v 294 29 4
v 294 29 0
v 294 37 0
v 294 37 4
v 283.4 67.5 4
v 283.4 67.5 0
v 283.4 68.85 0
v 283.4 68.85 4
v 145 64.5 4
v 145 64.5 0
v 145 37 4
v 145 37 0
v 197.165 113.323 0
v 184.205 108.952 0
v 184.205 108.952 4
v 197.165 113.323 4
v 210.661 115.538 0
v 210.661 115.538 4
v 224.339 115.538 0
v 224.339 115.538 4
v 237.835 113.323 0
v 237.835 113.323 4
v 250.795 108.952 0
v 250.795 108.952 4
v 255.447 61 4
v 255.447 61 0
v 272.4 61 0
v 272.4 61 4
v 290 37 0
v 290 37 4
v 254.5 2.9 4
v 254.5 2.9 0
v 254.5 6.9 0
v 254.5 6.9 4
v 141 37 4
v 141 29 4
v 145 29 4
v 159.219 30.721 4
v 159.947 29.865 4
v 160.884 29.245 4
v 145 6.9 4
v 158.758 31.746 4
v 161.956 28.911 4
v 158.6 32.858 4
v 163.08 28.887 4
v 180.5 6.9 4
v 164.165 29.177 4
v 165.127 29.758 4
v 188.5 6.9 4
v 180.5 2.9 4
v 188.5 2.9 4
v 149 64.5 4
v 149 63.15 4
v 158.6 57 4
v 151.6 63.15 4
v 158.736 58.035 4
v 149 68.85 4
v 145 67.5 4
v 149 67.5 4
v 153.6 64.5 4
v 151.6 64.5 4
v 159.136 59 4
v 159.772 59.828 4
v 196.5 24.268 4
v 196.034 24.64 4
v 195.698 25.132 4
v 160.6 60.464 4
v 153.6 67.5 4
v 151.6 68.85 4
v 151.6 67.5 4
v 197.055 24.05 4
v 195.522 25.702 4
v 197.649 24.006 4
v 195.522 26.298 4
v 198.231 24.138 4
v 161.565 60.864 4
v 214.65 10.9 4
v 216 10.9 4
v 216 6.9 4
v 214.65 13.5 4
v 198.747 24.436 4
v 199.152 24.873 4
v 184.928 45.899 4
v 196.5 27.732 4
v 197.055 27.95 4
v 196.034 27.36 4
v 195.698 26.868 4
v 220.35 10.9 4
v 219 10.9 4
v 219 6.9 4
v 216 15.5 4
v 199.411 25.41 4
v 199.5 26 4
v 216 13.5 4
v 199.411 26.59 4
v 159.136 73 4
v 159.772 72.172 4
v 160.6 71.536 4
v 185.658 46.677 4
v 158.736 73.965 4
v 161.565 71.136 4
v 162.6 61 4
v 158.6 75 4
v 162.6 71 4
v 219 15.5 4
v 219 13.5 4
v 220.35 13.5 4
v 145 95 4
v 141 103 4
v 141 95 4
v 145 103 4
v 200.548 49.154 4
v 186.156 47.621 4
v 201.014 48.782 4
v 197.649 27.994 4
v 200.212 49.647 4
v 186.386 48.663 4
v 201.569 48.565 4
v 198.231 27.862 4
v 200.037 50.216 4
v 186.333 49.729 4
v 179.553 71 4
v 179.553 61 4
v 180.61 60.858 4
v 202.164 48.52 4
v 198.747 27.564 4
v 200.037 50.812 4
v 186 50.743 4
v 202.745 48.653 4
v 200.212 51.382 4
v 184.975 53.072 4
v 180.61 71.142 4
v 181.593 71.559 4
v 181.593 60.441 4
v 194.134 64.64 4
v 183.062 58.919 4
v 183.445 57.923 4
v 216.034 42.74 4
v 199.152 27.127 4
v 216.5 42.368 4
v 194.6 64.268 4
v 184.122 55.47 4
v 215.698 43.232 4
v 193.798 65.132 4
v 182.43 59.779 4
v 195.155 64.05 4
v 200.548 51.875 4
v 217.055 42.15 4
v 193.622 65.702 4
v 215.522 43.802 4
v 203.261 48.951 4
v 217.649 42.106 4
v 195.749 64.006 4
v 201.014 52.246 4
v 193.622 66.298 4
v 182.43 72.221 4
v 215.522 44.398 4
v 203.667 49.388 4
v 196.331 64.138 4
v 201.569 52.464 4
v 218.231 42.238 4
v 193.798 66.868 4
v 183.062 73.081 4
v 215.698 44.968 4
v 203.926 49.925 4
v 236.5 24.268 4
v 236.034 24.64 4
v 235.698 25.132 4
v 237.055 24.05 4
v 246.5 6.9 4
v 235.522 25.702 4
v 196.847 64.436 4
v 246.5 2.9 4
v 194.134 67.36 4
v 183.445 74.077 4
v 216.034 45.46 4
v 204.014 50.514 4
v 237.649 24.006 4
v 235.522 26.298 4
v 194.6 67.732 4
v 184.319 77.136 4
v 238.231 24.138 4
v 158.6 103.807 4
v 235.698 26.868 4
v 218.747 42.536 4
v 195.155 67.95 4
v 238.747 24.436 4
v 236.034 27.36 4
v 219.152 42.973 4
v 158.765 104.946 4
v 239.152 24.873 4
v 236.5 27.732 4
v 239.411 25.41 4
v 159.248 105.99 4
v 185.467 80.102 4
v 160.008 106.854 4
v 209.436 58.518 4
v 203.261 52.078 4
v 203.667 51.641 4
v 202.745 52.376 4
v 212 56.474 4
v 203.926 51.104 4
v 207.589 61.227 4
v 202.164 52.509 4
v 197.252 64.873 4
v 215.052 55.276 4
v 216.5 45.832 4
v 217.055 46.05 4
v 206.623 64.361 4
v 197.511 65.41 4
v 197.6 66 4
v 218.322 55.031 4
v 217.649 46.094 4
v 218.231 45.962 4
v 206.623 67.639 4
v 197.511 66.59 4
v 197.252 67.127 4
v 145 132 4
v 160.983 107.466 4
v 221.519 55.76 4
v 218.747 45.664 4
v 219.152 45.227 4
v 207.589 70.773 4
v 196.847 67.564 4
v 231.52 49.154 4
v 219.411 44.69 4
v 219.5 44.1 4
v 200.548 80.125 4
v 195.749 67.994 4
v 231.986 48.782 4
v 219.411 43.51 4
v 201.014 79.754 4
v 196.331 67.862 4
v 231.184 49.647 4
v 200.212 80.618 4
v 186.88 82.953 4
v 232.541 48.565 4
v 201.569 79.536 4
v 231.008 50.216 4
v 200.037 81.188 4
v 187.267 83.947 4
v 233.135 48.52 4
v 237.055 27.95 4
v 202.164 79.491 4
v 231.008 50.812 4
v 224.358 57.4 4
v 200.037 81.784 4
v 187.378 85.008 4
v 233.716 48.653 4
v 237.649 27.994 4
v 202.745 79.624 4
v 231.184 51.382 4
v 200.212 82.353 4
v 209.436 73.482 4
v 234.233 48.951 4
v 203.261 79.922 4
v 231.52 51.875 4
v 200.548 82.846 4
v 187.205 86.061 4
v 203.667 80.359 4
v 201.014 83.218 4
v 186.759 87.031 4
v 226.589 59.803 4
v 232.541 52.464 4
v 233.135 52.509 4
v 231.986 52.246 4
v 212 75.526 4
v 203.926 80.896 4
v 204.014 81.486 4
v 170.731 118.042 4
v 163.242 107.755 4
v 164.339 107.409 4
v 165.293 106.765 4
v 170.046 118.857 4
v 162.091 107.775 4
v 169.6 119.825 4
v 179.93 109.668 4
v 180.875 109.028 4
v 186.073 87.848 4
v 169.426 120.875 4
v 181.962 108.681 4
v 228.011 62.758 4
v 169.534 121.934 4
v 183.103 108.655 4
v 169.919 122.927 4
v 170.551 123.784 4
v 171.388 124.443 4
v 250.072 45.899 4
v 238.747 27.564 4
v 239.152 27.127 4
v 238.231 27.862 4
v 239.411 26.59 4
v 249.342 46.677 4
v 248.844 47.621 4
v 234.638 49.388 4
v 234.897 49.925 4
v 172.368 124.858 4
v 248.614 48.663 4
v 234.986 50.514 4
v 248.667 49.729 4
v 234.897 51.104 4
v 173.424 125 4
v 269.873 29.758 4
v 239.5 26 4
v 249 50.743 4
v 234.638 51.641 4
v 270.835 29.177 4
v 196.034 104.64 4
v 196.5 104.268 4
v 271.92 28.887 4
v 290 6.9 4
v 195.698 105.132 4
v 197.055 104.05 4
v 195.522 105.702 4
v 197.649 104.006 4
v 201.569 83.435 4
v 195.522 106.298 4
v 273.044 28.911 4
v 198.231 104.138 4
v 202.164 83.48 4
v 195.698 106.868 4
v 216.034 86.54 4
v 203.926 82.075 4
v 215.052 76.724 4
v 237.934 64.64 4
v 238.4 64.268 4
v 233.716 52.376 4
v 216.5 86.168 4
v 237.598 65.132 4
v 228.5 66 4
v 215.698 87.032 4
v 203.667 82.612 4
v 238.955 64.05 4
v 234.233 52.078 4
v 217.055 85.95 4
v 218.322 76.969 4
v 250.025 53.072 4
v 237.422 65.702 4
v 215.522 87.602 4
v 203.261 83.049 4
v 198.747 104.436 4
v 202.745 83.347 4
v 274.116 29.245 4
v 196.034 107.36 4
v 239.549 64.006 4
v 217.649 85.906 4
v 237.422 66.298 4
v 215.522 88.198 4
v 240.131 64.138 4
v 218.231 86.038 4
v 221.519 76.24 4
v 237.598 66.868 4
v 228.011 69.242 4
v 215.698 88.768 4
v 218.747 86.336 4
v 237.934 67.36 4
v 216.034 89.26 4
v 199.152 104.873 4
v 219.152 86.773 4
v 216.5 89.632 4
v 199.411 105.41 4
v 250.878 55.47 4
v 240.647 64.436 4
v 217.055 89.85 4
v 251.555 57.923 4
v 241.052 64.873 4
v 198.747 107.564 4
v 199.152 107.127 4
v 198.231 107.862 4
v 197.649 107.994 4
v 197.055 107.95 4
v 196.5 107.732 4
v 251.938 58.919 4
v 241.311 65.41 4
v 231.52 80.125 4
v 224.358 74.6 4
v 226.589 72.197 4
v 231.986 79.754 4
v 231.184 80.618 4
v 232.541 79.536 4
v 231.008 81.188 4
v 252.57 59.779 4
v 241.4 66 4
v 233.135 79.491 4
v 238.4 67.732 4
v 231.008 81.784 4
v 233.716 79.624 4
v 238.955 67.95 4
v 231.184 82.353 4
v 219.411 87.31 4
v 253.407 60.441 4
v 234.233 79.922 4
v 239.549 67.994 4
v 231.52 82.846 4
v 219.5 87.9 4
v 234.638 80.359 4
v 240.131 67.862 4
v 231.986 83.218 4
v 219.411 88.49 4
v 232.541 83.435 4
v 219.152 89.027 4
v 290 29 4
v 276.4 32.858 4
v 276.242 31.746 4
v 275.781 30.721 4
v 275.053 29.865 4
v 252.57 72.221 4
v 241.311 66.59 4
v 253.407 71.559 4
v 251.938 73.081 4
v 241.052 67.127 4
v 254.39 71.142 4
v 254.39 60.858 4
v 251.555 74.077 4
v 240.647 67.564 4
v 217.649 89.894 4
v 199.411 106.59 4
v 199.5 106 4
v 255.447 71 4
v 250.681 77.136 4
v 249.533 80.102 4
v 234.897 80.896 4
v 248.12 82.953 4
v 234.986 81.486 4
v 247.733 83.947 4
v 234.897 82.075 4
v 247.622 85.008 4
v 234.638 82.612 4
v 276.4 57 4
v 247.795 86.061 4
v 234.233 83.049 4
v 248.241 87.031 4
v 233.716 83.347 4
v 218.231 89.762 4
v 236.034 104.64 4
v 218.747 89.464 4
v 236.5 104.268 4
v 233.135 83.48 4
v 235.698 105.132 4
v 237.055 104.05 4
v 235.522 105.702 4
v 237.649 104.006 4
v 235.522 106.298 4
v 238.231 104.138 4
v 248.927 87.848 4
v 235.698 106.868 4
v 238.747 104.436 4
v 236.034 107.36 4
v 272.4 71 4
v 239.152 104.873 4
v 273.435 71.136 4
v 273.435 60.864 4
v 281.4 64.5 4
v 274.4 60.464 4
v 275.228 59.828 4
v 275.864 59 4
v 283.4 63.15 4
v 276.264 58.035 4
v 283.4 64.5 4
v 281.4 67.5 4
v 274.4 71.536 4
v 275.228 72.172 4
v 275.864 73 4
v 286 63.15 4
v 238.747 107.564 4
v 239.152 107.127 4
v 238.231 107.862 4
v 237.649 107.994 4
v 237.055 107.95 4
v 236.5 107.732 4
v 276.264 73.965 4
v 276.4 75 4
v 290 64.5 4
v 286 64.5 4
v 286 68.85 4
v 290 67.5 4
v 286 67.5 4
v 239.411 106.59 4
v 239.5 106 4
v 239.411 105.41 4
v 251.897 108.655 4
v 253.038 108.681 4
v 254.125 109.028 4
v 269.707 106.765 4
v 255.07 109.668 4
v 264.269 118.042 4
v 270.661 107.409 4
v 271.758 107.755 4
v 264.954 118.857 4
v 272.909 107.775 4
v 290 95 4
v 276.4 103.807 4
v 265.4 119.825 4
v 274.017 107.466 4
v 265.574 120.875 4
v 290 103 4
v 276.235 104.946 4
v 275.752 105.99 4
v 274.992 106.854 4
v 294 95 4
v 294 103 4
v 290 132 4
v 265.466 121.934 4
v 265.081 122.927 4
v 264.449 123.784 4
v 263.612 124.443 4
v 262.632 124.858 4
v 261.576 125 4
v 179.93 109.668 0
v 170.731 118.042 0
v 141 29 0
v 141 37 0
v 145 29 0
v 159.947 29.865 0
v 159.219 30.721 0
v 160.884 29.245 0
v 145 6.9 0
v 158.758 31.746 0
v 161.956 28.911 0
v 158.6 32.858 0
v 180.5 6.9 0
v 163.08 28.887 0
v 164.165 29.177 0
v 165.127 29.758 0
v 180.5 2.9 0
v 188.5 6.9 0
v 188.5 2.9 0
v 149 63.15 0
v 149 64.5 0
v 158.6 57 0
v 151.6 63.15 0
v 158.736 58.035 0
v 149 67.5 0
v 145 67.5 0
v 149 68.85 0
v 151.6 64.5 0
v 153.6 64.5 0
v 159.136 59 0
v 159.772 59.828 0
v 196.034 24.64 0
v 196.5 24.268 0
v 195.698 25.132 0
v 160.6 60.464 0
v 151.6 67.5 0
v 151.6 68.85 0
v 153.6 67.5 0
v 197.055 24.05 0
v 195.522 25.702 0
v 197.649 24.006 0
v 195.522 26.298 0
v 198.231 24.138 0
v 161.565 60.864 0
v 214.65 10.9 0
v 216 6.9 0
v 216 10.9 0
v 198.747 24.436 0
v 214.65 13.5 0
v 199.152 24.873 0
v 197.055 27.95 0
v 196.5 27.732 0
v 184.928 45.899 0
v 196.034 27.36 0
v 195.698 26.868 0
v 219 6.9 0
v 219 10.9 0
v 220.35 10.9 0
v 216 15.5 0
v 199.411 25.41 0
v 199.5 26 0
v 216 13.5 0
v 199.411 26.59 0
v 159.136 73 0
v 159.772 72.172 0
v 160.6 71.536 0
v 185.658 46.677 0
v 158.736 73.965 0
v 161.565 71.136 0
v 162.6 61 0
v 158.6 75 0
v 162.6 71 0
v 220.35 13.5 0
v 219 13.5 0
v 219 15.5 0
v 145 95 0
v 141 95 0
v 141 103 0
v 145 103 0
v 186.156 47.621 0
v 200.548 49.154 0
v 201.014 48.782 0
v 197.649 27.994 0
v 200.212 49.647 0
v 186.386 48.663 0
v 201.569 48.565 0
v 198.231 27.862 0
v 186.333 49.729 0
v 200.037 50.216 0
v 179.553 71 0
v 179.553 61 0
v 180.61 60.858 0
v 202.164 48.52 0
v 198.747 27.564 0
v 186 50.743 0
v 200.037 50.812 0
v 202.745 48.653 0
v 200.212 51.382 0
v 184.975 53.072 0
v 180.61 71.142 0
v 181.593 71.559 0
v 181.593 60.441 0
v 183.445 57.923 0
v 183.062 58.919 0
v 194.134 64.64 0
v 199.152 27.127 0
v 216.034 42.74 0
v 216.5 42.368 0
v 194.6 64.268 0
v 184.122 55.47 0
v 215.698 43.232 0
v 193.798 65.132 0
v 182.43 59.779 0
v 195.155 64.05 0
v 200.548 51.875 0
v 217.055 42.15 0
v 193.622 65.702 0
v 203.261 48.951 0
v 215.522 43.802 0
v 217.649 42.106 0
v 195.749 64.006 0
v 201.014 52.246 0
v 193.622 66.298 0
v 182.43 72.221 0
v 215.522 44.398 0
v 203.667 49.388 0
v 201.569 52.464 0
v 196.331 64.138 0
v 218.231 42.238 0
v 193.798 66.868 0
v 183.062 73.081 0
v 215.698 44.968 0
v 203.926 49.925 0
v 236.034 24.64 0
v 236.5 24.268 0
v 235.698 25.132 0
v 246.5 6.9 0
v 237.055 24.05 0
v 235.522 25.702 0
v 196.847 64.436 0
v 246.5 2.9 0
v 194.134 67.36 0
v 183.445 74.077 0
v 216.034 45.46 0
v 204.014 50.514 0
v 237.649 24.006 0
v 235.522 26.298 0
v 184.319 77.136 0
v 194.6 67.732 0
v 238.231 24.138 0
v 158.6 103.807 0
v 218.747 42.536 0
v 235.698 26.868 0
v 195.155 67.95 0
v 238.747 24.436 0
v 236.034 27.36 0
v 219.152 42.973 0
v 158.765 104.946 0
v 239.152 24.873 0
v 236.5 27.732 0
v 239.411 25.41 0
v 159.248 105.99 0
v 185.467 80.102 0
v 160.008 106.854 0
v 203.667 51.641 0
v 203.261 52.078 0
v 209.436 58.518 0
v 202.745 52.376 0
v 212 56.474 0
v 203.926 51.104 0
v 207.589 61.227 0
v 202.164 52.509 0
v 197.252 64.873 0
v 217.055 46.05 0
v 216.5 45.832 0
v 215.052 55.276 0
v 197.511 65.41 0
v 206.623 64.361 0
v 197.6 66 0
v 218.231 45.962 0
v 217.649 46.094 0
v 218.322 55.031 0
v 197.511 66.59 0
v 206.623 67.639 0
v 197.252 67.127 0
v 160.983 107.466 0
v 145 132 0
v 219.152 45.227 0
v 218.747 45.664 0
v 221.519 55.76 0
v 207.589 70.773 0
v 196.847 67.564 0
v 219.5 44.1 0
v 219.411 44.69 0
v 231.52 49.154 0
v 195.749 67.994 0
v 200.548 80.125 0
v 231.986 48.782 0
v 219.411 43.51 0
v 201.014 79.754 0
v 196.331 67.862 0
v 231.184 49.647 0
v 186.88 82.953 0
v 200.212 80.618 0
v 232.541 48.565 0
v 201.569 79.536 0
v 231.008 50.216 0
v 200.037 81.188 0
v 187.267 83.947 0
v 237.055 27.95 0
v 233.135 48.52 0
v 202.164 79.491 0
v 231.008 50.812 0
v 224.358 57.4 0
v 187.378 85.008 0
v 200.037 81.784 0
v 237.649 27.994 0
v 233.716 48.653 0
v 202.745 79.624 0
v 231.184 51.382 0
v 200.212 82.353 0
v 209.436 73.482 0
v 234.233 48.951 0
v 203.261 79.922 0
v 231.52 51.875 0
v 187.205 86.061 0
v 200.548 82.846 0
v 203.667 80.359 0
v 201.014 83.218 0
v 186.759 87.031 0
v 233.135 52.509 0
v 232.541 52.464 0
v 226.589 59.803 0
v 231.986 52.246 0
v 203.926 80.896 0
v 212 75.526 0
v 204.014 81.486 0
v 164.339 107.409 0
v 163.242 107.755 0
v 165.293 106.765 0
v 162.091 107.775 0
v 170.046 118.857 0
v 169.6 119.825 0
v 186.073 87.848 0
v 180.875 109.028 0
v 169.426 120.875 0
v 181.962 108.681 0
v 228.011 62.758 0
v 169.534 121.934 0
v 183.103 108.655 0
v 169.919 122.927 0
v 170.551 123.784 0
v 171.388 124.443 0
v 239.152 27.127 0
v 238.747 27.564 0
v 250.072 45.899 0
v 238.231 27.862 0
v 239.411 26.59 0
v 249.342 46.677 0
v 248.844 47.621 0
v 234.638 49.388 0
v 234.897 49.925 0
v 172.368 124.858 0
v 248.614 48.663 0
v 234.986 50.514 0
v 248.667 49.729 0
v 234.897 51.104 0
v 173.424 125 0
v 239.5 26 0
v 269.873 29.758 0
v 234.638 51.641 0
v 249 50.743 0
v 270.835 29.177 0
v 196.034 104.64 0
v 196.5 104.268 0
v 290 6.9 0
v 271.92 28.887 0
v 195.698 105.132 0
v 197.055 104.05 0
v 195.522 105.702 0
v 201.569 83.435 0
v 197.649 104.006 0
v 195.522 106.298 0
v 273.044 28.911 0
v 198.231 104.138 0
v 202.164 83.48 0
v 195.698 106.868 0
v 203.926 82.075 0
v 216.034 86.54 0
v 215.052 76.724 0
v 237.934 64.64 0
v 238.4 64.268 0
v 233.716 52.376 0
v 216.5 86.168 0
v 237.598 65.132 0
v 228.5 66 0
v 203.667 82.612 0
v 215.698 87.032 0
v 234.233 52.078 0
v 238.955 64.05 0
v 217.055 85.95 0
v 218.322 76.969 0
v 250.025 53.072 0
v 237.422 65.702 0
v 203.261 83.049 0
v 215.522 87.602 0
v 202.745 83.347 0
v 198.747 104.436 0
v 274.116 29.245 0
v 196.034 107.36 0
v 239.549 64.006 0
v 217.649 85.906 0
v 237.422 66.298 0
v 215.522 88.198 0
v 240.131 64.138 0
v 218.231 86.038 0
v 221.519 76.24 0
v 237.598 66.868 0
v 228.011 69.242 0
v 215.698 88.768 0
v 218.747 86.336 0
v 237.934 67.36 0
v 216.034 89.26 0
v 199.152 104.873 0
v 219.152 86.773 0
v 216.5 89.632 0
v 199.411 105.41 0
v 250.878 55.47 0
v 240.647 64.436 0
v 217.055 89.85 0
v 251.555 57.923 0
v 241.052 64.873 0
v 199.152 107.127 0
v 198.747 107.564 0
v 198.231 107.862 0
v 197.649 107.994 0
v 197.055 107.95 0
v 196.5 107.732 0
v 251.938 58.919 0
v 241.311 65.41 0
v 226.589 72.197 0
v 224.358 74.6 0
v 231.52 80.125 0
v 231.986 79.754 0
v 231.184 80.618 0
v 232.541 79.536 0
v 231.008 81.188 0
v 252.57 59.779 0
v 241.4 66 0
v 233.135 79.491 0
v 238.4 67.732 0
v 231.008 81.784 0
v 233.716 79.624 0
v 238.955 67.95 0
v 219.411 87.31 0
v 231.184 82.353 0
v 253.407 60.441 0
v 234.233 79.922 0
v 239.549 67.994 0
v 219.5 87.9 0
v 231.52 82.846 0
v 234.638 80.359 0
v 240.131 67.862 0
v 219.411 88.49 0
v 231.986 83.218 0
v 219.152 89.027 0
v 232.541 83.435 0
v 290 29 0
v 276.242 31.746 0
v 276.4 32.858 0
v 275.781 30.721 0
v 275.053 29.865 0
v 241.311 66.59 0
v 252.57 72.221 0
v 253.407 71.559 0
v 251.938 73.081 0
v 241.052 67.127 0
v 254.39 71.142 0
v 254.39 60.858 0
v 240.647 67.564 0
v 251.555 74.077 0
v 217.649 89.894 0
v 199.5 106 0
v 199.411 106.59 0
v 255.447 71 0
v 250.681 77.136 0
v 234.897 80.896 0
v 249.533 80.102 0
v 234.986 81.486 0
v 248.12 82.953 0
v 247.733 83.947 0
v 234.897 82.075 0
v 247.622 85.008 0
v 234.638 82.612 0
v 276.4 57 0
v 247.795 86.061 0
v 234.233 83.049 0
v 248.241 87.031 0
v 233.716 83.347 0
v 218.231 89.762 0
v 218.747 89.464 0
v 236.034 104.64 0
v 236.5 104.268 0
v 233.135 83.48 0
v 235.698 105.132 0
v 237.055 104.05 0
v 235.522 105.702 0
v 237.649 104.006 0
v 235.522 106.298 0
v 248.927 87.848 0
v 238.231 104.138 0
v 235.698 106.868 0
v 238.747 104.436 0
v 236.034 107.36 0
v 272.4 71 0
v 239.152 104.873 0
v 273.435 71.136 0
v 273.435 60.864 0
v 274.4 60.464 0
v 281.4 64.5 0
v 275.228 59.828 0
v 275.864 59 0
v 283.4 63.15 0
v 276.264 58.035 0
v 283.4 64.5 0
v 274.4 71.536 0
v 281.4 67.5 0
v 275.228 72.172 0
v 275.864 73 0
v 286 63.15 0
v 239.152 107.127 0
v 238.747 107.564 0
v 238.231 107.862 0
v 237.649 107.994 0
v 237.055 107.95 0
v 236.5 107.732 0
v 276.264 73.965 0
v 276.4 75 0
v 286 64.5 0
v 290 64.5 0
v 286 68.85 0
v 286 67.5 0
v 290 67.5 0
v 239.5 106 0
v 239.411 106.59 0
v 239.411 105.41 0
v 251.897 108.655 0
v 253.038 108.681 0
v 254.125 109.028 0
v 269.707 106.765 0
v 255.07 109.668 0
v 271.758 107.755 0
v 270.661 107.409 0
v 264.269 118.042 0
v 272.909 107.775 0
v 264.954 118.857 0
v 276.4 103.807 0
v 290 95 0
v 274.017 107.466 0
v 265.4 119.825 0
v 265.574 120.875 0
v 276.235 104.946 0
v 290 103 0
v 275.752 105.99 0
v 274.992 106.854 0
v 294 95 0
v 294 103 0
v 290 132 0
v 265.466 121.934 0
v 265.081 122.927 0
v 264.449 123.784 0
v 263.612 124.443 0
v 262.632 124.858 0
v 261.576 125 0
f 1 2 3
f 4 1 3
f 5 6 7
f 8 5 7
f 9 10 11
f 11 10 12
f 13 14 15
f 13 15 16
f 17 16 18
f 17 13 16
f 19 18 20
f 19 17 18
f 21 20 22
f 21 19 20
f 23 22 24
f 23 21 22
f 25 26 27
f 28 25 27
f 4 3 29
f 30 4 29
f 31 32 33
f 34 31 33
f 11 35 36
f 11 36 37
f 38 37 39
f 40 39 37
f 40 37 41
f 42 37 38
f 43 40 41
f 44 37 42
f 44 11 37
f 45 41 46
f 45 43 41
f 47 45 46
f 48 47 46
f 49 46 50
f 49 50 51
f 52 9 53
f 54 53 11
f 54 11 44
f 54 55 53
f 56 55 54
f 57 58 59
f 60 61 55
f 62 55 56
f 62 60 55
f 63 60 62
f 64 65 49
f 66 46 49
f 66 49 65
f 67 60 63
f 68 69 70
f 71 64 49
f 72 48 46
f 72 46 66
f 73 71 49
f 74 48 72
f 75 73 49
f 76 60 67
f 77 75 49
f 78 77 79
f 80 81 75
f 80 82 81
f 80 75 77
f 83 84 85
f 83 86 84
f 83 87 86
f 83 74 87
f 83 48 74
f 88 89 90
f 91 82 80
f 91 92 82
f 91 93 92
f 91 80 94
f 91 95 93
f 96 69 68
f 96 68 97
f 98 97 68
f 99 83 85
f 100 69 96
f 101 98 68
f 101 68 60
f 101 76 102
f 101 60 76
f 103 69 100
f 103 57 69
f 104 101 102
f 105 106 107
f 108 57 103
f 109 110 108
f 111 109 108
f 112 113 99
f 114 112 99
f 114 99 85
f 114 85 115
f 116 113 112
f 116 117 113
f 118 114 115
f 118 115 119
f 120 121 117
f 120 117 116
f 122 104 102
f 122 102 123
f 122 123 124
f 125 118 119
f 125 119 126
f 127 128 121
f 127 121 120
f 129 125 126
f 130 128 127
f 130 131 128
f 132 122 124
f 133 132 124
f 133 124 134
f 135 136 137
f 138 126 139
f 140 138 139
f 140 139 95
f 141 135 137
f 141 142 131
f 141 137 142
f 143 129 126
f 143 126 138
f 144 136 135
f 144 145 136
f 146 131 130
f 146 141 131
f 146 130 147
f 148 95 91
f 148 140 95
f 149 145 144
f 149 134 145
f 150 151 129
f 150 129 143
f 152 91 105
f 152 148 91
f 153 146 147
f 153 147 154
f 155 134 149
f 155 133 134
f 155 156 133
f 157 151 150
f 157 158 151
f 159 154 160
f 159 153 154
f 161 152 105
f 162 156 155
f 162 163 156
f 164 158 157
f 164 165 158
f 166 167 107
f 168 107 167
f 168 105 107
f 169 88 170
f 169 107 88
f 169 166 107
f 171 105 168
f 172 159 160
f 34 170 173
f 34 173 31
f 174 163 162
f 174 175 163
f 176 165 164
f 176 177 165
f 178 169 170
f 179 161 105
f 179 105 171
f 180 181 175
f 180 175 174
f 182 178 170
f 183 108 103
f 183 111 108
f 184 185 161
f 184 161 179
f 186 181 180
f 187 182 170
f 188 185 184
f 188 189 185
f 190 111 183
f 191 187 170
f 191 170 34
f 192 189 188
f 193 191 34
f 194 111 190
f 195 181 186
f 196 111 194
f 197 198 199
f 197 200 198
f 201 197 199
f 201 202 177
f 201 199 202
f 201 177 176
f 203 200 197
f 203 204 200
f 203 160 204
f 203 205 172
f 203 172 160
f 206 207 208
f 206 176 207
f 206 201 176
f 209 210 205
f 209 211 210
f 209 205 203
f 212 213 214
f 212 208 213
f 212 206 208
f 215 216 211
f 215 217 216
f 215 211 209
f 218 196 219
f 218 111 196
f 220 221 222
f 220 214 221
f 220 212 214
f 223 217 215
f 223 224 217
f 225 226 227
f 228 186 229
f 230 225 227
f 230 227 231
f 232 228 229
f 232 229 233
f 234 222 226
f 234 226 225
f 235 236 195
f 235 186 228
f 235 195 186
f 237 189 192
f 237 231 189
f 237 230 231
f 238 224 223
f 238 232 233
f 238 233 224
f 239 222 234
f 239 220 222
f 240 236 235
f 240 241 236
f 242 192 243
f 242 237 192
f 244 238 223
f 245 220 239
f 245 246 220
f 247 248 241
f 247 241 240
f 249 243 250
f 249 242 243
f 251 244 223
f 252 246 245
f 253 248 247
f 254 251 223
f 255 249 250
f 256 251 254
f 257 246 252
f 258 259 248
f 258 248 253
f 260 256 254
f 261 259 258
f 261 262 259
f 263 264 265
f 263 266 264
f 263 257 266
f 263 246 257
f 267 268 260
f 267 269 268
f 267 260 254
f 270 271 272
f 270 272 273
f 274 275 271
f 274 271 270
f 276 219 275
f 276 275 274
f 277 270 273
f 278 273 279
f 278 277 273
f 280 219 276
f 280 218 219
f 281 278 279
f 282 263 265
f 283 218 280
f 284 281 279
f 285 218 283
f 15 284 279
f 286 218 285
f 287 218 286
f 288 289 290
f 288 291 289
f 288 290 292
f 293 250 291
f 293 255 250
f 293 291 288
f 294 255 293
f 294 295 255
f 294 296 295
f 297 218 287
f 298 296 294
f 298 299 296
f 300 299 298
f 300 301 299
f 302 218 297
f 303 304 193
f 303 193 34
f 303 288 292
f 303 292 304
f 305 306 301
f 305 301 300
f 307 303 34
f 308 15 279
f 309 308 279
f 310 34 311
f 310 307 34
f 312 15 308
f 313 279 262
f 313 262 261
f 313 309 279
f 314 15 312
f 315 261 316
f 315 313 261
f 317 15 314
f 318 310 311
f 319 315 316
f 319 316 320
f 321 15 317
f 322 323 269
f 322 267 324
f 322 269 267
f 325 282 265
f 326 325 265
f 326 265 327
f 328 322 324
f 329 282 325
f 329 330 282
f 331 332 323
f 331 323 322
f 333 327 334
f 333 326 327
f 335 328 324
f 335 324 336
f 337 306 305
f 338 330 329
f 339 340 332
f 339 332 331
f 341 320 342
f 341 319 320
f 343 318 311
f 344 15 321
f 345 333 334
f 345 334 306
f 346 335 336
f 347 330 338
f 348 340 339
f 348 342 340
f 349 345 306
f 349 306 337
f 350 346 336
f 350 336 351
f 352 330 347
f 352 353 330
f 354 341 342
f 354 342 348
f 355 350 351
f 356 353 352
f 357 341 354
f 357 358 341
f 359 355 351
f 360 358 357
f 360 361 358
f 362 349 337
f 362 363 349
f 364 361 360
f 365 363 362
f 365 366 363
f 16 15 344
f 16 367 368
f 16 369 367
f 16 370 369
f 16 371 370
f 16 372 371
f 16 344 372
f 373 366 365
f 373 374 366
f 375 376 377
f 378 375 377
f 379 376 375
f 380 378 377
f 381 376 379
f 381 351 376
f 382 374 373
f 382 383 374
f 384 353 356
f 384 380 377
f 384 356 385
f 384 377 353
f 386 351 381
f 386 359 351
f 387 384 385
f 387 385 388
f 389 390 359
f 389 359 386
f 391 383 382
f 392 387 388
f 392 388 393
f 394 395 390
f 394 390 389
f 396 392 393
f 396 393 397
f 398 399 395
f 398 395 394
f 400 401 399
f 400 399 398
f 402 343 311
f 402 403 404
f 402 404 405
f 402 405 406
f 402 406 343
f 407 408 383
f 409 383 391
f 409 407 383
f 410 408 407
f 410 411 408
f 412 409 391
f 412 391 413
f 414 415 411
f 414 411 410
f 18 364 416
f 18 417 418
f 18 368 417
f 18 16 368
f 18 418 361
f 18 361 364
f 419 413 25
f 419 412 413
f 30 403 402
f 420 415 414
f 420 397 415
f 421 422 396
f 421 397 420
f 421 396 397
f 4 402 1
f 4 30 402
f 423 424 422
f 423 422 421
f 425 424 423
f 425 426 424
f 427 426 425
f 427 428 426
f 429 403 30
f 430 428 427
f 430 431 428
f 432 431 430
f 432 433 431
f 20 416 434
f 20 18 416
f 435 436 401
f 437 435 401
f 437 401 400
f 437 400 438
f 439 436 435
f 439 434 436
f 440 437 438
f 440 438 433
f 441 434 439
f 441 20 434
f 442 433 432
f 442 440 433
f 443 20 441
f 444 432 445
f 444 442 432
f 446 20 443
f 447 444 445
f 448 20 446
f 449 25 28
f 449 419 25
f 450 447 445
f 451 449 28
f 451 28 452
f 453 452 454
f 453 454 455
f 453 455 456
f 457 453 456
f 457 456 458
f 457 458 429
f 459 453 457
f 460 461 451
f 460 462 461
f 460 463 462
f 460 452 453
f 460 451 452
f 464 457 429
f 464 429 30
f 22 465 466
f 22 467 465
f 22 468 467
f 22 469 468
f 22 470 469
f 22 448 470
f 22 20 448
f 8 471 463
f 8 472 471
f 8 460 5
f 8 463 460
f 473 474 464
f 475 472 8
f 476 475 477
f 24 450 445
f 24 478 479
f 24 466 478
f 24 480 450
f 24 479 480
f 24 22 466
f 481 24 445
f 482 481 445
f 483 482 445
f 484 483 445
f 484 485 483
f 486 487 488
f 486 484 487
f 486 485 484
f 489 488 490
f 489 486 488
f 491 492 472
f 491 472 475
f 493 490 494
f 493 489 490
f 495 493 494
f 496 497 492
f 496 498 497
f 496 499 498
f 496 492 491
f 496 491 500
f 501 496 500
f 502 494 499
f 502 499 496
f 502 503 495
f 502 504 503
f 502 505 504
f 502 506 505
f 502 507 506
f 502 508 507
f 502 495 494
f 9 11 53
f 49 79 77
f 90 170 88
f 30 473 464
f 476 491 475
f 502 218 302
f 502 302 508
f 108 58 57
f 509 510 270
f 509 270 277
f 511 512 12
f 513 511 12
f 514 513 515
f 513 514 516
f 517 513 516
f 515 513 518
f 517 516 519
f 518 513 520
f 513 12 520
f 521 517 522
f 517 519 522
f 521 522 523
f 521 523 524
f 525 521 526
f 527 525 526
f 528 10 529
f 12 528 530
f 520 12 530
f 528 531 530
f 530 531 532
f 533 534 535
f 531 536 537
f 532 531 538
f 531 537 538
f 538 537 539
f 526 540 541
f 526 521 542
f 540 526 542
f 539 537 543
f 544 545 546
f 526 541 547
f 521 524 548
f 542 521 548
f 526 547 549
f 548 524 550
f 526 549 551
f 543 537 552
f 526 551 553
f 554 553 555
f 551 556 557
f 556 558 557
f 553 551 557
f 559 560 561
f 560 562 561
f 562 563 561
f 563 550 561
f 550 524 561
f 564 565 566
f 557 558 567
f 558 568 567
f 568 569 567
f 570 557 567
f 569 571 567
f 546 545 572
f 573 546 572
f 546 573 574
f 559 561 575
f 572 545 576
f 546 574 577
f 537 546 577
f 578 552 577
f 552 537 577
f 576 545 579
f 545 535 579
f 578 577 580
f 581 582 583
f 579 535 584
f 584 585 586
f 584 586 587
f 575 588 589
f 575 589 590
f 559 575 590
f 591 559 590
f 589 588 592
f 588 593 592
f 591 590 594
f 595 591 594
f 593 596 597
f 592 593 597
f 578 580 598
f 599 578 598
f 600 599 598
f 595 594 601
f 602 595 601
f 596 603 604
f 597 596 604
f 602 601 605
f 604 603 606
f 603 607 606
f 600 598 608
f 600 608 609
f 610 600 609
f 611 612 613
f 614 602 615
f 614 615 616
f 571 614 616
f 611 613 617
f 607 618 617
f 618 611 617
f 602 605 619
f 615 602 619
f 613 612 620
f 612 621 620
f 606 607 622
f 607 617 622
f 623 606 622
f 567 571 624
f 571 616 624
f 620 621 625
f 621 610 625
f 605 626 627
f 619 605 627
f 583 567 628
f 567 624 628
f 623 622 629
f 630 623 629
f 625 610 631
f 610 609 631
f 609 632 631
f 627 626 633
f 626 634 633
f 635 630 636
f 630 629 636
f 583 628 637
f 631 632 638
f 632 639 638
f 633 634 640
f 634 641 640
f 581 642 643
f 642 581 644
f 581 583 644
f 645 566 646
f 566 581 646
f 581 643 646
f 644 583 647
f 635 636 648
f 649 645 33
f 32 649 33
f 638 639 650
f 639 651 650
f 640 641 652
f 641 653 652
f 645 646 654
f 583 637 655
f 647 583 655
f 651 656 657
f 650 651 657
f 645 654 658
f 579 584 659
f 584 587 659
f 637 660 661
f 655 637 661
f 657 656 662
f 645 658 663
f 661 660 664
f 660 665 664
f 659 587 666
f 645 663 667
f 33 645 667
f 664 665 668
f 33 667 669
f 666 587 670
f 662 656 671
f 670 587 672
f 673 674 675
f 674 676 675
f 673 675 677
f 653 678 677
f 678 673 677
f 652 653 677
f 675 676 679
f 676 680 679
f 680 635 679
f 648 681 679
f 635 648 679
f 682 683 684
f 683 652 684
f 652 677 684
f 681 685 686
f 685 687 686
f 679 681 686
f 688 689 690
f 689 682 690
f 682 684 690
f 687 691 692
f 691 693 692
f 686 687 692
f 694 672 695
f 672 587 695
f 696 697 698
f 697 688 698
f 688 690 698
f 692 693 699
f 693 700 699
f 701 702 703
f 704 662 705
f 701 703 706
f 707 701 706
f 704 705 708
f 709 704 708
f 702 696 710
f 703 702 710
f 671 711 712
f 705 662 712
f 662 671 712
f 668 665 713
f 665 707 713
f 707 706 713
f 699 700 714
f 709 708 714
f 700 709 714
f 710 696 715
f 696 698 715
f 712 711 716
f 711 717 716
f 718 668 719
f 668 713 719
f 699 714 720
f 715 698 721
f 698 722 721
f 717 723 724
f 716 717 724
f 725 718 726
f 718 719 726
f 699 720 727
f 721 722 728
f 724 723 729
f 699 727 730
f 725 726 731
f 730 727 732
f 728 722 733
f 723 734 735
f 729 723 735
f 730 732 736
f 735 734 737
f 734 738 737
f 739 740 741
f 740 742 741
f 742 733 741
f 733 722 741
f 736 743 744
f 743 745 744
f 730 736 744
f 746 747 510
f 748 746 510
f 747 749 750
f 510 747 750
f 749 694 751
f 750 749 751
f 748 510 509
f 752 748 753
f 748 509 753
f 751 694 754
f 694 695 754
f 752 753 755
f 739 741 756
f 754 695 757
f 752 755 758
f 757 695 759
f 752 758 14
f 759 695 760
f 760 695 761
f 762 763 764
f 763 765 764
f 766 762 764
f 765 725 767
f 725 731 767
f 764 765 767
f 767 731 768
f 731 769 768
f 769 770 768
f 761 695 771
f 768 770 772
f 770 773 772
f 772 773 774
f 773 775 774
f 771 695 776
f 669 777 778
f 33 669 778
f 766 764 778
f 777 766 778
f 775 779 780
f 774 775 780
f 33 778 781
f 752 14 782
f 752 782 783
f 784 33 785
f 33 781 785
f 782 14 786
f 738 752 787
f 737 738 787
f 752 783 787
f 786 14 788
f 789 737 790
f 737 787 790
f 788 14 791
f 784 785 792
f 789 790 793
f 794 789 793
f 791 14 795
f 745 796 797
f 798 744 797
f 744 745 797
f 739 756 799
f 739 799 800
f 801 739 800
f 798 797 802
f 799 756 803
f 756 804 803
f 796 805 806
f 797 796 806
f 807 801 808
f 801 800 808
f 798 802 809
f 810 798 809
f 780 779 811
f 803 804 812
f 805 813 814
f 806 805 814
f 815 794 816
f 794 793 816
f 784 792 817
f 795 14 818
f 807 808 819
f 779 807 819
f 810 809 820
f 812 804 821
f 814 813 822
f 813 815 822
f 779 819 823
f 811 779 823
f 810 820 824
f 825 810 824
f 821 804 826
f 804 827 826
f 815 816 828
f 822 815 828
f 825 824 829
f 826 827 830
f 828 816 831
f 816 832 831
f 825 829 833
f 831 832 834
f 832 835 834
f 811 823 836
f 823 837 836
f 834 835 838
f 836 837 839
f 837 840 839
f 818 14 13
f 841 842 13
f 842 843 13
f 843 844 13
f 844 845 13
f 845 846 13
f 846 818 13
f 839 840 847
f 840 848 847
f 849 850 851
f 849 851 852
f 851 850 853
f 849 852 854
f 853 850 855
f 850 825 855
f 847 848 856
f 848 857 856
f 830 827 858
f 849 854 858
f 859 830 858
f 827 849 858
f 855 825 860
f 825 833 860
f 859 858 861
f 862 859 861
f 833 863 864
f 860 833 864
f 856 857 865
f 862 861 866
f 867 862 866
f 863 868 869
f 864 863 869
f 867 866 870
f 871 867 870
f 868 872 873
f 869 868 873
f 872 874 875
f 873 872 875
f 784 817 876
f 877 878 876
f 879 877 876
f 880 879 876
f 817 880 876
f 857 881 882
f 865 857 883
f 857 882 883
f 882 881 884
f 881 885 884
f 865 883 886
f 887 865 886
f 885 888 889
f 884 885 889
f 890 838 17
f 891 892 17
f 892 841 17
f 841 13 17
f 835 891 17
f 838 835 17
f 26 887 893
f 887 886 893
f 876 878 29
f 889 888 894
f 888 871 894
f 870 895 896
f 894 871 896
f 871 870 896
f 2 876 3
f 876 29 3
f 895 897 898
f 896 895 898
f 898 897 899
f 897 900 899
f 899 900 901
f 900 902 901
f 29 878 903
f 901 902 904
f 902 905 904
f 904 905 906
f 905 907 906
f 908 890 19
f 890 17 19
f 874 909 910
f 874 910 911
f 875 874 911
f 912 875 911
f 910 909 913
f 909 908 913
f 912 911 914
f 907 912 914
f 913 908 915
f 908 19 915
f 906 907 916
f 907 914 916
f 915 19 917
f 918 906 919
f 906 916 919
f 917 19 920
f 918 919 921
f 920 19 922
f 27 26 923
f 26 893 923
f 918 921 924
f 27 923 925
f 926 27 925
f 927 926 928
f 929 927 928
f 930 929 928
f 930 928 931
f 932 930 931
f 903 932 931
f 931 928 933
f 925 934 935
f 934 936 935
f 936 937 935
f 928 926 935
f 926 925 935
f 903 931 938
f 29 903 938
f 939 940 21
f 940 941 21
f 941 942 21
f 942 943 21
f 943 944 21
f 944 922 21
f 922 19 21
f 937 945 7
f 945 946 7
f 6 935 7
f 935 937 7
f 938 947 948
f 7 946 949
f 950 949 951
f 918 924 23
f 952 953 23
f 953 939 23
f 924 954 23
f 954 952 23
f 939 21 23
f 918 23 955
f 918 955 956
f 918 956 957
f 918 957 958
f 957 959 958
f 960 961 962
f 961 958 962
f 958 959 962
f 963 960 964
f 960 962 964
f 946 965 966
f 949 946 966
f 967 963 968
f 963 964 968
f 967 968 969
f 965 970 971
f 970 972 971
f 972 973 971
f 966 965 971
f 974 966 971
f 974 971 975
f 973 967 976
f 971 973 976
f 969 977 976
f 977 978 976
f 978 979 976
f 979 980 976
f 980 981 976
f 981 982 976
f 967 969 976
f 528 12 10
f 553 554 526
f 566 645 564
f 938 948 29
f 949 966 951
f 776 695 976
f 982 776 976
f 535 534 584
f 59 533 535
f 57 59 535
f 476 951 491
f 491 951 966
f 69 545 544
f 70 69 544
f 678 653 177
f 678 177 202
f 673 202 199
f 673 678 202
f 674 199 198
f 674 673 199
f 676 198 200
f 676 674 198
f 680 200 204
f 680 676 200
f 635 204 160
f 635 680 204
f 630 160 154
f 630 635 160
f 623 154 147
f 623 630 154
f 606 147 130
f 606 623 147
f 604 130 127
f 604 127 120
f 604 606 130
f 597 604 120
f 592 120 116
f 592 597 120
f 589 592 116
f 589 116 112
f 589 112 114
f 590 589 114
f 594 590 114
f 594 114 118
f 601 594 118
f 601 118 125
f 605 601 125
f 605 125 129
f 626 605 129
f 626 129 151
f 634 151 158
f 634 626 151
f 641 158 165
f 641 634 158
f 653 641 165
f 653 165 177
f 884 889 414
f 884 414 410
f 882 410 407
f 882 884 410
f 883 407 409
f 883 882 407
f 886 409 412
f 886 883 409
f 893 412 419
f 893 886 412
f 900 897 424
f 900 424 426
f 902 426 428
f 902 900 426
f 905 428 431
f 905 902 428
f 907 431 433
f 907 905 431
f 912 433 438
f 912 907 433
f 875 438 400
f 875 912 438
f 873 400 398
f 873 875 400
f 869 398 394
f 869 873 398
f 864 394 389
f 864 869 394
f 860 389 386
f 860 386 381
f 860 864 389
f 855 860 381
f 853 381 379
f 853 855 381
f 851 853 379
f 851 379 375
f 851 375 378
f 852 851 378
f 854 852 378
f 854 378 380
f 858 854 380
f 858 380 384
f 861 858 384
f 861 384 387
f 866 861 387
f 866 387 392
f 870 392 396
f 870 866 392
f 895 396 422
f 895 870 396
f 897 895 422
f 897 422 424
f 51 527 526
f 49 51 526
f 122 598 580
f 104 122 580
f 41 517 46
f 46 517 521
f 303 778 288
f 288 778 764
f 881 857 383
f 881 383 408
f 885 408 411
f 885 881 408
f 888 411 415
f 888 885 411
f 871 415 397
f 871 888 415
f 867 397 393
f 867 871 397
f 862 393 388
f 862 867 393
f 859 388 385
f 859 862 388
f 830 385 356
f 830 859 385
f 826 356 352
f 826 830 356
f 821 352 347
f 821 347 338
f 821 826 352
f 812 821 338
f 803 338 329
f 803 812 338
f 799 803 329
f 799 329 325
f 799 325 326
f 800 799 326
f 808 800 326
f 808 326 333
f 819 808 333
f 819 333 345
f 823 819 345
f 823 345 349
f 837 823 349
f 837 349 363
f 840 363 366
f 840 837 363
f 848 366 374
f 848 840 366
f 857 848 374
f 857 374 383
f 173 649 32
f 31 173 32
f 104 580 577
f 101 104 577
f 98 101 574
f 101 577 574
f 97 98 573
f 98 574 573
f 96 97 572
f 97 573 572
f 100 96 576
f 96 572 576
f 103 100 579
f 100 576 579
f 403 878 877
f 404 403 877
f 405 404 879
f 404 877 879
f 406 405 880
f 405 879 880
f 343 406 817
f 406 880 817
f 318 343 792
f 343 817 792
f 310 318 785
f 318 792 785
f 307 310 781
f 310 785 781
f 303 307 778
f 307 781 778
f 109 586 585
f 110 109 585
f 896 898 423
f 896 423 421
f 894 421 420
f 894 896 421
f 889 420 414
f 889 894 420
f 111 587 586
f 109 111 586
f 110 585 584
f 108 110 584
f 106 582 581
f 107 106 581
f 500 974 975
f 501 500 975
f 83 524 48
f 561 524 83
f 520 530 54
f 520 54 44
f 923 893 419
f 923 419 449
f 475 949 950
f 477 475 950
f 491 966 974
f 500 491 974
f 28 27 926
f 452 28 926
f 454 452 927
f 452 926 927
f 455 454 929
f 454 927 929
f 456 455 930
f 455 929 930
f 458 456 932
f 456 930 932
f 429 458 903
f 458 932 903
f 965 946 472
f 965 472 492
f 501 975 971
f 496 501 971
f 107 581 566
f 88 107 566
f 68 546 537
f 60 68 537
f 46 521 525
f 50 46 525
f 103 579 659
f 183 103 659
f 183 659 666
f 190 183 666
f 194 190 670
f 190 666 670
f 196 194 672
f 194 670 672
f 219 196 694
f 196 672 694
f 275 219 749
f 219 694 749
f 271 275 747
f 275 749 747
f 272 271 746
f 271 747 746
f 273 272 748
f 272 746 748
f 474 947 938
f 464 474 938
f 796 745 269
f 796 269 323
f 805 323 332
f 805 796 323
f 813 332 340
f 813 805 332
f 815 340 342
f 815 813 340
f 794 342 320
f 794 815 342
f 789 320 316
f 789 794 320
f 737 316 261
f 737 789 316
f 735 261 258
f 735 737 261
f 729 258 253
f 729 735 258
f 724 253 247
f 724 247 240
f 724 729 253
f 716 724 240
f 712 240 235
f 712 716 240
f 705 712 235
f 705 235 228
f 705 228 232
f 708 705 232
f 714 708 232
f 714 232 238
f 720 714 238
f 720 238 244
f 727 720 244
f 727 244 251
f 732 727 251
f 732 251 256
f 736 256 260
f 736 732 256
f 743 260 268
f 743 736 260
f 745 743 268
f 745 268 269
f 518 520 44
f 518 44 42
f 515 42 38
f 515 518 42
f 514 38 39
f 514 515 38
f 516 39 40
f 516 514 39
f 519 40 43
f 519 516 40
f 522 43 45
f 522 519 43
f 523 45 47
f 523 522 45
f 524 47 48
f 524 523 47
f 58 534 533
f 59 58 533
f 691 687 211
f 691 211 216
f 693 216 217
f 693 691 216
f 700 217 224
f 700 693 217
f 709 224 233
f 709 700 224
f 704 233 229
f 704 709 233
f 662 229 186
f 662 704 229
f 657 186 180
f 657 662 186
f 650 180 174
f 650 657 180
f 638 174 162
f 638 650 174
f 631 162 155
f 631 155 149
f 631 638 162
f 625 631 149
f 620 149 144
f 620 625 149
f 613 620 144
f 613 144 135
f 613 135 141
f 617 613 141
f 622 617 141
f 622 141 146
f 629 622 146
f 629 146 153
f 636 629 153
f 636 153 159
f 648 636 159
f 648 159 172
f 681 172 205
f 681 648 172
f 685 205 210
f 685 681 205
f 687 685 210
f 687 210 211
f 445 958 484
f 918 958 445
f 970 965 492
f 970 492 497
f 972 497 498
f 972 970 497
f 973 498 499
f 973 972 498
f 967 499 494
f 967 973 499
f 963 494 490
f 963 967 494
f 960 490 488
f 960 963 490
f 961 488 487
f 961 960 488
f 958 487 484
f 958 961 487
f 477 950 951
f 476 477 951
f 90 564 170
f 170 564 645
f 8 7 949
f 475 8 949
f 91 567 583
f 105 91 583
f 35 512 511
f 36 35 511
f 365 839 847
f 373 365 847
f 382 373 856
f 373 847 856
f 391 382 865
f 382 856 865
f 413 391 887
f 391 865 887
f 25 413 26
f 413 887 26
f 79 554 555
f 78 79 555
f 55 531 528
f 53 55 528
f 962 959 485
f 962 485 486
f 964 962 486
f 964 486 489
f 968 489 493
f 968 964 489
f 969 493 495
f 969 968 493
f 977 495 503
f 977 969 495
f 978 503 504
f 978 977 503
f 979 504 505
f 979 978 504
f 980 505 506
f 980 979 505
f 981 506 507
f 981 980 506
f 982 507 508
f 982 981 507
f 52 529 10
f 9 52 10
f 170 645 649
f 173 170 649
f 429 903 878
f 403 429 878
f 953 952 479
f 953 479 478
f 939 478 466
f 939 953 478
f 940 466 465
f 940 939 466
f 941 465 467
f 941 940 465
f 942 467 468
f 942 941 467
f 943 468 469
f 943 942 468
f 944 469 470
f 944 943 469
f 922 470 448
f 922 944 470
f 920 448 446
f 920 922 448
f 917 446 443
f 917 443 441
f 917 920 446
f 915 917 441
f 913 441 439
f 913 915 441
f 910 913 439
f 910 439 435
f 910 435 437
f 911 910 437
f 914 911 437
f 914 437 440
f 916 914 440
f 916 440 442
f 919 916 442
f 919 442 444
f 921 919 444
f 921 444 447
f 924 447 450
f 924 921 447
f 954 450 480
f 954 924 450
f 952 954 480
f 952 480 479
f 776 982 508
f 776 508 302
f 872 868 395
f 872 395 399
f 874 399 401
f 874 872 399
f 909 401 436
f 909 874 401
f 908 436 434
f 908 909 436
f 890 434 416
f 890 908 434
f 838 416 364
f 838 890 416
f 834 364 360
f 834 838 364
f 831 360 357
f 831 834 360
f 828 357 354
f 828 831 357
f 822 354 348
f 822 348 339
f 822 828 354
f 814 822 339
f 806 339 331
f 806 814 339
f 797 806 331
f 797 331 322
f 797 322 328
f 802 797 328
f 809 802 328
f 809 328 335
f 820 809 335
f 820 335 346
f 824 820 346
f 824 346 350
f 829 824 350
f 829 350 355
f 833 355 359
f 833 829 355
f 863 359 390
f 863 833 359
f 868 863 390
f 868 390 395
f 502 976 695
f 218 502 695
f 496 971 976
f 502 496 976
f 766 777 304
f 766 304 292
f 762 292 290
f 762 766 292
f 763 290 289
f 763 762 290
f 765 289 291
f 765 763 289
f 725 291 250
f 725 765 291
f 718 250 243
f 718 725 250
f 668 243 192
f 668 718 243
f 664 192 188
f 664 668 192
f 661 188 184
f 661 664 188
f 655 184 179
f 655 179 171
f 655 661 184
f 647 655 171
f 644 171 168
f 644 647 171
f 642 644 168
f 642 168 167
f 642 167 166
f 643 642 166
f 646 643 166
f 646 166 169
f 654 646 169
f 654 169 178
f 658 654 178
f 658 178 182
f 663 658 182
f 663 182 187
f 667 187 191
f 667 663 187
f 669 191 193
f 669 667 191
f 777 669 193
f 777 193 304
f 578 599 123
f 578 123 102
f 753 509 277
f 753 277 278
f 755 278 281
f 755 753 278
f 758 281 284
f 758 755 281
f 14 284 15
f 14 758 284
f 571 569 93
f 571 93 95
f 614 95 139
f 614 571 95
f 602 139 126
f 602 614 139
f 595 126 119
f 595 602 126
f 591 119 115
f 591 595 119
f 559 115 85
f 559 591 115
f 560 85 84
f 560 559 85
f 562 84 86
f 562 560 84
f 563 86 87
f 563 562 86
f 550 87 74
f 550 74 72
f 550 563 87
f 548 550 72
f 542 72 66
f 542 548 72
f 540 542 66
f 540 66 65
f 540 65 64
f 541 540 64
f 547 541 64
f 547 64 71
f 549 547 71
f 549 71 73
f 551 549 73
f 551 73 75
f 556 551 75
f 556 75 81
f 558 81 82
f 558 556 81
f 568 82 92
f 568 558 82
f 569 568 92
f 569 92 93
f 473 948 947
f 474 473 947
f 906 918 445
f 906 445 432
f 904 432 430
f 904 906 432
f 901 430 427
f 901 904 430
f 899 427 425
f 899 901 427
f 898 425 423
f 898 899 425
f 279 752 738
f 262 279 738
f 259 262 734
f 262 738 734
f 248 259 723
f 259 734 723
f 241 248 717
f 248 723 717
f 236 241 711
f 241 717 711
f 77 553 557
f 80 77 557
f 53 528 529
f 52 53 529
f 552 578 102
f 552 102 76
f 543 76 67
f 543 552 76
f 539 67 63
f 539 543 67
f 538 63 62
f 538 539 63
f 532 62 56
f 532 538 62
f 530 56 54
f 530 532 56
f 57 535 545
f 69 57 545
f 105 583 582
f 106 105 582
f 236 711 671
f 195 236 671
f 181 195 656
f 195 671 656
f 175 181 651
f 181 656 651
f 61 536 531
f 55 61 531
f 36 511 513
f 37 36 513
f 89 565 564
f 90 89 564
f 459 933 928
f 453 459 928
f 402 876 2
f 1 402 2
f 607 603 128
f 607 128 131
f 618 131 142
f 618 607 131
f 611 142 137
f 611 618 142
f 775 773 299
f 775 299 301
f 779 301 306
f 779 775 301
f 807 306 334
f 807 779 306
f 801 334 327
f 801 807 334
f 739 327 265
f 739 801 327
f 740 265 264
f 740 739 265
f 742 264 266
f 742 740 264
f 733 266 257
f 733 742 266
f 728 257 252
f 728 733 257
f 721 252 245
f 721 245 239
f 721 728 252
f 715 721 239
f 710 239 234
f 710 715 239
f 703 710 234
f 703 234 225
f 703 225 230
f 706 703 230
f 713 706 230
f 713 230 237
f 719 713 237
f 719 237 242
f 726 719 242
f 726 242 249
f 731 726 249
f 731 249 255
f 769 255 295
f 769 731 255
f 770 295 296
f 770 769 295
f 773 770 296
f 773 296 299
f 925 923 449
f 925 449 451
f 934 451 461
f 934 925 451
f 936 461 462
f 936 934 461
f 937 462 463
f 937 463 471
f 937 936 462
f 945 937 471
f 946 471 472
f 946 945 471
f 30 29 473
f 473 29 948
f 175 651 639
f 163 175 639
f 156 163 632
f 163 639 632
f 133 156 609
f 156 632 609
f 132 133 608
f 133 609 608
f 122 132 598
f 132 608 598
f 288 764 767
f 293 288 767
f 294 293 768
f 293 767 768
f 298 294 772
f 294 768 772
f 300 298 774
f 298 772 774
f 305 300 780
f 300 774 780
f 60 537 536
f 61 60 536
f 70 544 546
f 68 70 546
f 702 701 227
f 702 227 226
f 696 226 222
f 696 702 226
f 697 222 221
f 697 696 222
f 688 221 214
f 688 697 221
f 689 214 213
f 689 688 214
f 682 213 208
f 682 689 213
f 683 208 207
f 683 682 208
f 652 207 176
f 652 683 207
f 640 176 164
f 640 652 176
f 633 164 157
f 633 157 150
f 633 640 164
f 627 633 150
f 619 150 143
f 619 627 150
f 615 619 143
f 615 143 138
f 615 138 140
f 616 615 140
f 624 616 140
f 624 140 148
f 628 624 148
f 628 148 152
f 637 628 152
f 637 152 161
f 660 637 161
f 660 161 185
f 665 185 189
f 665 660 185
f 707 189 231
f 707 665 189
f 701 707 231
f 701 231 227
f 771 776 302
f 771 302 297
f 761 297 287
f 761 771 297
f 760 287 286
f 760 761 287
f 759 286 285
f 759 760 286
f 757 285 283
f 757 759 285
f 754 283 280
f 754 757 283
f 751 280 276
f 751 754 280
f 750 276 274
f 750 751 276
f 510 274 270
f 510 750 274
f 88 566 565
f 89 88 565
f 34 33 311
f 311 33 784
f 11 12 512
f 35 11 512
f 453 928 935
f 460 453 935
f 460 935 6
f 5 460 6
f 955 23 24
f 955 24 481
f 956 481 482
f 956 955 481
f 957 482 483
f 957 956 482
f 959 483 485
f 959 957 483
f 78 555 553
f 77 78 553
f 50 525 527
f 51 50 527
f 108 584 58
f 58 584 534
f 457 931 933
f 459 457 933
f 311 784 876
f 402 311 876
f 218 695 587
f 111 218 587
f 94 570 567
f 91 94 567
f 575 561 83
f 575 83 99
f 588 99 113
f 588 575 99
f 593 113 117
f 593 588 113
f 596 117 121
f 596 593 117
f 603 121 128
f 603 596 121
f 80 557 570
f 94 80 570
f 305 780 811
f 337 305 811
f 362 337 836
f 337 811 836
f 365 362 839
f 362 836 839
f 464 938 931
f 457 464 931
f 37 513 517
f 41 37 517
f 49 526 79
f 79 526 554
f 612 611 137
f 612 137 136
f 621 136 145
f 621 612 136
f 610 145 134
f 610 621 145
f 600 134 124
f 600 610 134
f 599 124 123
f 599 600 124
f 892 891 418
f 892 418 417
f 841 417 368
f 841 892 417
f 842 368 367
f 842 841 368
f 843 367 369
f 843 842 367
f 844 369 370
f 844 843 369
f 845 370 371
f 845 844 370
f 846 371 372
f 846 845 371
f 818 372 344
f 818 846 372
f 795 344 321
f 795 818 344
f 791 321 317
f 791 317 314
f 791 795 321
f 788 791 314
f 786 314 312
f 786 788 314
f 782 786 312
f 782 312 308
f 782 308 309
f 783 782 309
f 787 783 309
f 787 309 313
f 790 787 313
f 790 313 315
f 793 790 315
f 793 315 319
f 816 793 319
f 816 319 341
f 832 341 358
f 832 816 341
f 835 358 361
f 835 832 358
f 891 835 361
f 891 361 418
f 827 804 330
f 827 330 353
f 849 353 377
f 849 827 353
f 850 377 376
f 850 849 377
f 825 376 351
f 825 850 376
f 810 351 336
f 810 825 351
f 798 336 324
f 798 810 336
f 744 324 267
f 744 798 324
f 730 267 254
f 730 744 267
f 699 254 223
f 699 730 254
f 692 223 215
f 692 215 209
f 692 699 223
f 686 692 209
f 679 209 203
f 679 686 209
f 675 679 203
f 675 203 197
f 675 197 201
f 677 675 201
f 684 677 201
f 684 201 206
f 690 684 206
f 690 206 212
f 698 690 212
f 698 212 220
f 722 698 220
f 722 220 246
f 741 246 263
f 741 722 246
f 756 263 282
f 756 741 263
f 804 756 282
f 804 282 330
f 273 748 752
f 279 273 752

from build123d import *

# Parameters (mm, degrees)
SKETCH_1_R          = 2
SKETCH_1_R_2        = 11
EXTRUDE_1_DEPTH     = 4
CUT_EXTRUDE_2_DEPTH = 4


with BuildPart() as part:
    # 草图1 → 凸台-拉伸1 (new body)
    with BuildSketch(Plane.XY):
        Polygon((149, 64.5), (145, 64.5), (145, 37), (141, 37), (141, 29), (145, 29), (145, 6.9), (151.5, 6.9), (180.5, 6.9), (180.5, 2.9), (188.5, 2.9), (188.5, 6.9), (216, 6.9), (216, 10.9), (214.65, 10.9), (214.65, 13.5), (216, 13.5), (216, 15.5), (219, 15.5), (219, 13.5), (220.35, 13.5), (220.35, 10.9), (219, 10.9), (219, 6.9), (246.5, 6.9), (246.5, 2.9), (254.5, 2.9), (254.5, 6.9), (283.5, 6.9), (290, 6.9), (290, 29), (294, 29), (294, 37), (290, 37), (290, 64.5), (286, 64.5), (286, 63.15), (283.4, 63.15), (283.4, 64.5), (281.4, 64.5), (281.4, 67.5), (283.4, 67.5), (283.4, 68.85), (286, 68.85), (286, 67.5), (290, 67.5), (290, 95), (294, 95), (294, 103), (290, 103), (290, 132), (145, 132), (145, 103), (141, 103), (141, 95), (145, 95), (145, 67.5), (149, 67.5), (149, 68.85), (151.6, 68.85), (151.6, 67.5), (153.6, 67.5), (153.6, 64.5), (151.6, 64.5), (151.6, 63.15), (149, 63.15), align=None)
        with Locations((197.5, 26)):
            Circle(SKETCH_1_R, mode=Mode.SUBTRACT)
        with Locations((202.014361492, 50.514361492)):
            Circle(SKETCH_1_R, mode=Mode.SUBTRACT)
        with Locations((195.6, 66)):
            Circle(SKETCH_1_R, mode=Mode.SUBTRACT)
        with Locations((237.5, 26)):
            Circle(SKETCH_1_R, mode=Mode.SUBTRACT)
        with Locations((217.5, 44.1)):
            Circle(SKETCH_1_R, mode=Mode.SUBTRACT)
        with Locations((232.985638508, 50.514361492)):
            Circle(SKETCH_1_R, mode=Mode.SUBTRACT)
        with Locations((217.5, 66)):
            Circle(SKETCH_1_R_2, mode=Mode.SUBTRACT)
        with Locations((239.4, 66)):
            Circle(SKETCH_1_R, mode=Mode.SUBTRACT)
        with Locations((202.014361492, 81.485638508)):
            Circle(SKETCH_1_R, mode=Mode.SUBTRACT)
        with Locations((197.5, 106)):
            Circle(SKETCH_1_R, mode=Mode.SUBTRACT)
        with Locations((232.985638508, 81.485638508)):
            Circle(SKETCH_1_R, mode=Mode.SUBTRACT)
        with Locations((217.5, 87.9)):
            Circle(SKETCH_1_R, mode=Mode.SUBTRACT)
        with Locations((237.5, 106)):
            Circle(SKETCH_1_R, mode=Mode.SUBTRACT)
    extrude(amount=EXTRUDE_1_DEPTH)

    # 草图3 → 切除-拉伸2 (cut)
    with BuildSketch(Plane(origin=(0, 0, 0), x_dir=(-1, 0, 0), z_dir=(0, 0, -1))):
        with BuildLine():
            Line((-255.447331922, 61), (-272.4, 61))
            ThreePointArc((-272.4, 61), (-275.228427125, 59.828427125), (-276.4, 57))
            Line((-276.4, 57), (-276.4, 32.858450899))
            ThreePointArc((-276.4, 32.858450899), (-274.116182938, 29.24531983), (-269.872641938, 29.758053953))
            Line((-269.872641938, 29.758053953), (-250.07214558, 45.898872363))
            ThreePointArc((-250.07214558, 45.898872363), (-248.6940963, 48.134518776), (-248.999554551, 50.742933995))
            ThreePointArc((-248.999554551, 50.742933995), (-250.473448142, 54.263232234), (-251.555297879, 57.923076923))
            ThreePointArc((-251.555297879, 57.923076923), (-252.96663723, 60.137858162), (-255.447331922, 61))
        make_face()
        with BuildLine():
            Line((-269.707278747, 106.765103218), (-248.927132883, 87.848004914))
            ThreePointArc((-248.927132883, 87.848004914), (-247.673089718, 85.54051484), (-248.120381917, 82.952646144))
            ThreePointArc((-248.120381917, 82.952646144), (-250.140932956, 78.632082004), (-251.555297879, 74.076923077))
            ThreePointArc((-251.555297879, 74.076923077), (-252.96663723, 71.862141838), (-255.447331922, 71))
            Line((-255.447331922, 71), (-272.4, 71))
            ThreePointArc((-272.4, 71), (-275.228427125, 72.171572875), (-276.4, 75))
            Line((-276.4, 75), (-276.4, 103.807189721))
            ThreePointArc((-276.4, 103.807189721), (-274.016959336, 107.465801822), (-269.707278747, 106.765103218))
        make_face()
        with BuildLine():
            Line((-158.6, 57), (-158.6, 32.858450899))
            ThreePointArc((-158.6, 32.858450899), (-160.883817062, 29.24531983), (-165.127358062, 29.758053953))
            Line((-165.127358062, 29.758053953), (-184.92785442, 45.898872363))
            ThreePointArc((-184.92785442, 45.898872363), (-186.3059037, 48.134518776), (-186.000445449, 50.742933995))
            ThreePointArc((-186.000445449, 50.742933995), (-184.526551858, 54.263232234), (-183.444702121, 57.923076923))
            ThreePointArc((-183.444702121, 57.923076923), (-182.03336277, 60.137858162), (-179.552668078, 61))
            Line((-179.552668078, 61), (-162.6, 61))
            ThreePointArc((-162.6, 61), (-159.771572875, 59.828427125), (-158.6, 57))
        make_face()
        with BuildLine():
            Line((-179.552668078, 71), (-162.6, 71))
            ThreePointArc((-162.6, 71), (-159.771572875, 72.171572875), (-158.6, 75))
            Line((-158.6, 75), (-158.6, 103.807189721))
            ThreePointArc((-158.6, 103.807189721), (-160.983040664, 107.465801822), (-165.292721253, 106.765103218))
            Line((-165.292721253, 106.765103218), (-186.072867117, 87.848004914))
            ThreePointArc((-186.072867117, 87.848004914), (-187.326910282, 85.54051484), (-186.879618083, 82.952646144))
            ThreePointArc((-186.879618083, 82.952646144), (-184.859067044, 78.632082004), (-183.444702121, 74.076923077))
            ThreePointArc((-183.444702121, 74.076923077), (-182.03336277, 71.862141838), (-179.552668078, 71))
        make_face()
        with BuildLine():
            Line((-261.576319533, 125), (-173.423680467, 125))
            ThreePointArc((-173.423680467, 125), (-169.693288129, 122.443666515), (-170.730959214, 118.042086503))
            Line((-170.730959214, 118.042086503), (-179.92985273, 109.667921372))
            ThreePointArc((-179.92985273, 109.667921372), (-181.961826365, 108.680785745), (-184.204551796, 108.951961409))
            ThreePointArc((-184.204551796, 108.951961409), (-217.5, 115.815856239), (-250.795448204, 108.951961409))
            ThreePointArc((-250.795448204, 108.951961409), (-253.038173635, 108.680785745), (-255.07014727, 109.667921372))
            Line((-255.07014727, 109.667921372), (-264.269040786, 118.042086503))
            ThreePointArc((-264.269040786, 118.042086503), (-265.306711871, 122.443666515), (-261.576319533, 125))
        make_face()
    extrude(amount=-CUT_EXTRUDE_2_DEPTH, mode=Mode.SUBTRACT)


solid = part.part
